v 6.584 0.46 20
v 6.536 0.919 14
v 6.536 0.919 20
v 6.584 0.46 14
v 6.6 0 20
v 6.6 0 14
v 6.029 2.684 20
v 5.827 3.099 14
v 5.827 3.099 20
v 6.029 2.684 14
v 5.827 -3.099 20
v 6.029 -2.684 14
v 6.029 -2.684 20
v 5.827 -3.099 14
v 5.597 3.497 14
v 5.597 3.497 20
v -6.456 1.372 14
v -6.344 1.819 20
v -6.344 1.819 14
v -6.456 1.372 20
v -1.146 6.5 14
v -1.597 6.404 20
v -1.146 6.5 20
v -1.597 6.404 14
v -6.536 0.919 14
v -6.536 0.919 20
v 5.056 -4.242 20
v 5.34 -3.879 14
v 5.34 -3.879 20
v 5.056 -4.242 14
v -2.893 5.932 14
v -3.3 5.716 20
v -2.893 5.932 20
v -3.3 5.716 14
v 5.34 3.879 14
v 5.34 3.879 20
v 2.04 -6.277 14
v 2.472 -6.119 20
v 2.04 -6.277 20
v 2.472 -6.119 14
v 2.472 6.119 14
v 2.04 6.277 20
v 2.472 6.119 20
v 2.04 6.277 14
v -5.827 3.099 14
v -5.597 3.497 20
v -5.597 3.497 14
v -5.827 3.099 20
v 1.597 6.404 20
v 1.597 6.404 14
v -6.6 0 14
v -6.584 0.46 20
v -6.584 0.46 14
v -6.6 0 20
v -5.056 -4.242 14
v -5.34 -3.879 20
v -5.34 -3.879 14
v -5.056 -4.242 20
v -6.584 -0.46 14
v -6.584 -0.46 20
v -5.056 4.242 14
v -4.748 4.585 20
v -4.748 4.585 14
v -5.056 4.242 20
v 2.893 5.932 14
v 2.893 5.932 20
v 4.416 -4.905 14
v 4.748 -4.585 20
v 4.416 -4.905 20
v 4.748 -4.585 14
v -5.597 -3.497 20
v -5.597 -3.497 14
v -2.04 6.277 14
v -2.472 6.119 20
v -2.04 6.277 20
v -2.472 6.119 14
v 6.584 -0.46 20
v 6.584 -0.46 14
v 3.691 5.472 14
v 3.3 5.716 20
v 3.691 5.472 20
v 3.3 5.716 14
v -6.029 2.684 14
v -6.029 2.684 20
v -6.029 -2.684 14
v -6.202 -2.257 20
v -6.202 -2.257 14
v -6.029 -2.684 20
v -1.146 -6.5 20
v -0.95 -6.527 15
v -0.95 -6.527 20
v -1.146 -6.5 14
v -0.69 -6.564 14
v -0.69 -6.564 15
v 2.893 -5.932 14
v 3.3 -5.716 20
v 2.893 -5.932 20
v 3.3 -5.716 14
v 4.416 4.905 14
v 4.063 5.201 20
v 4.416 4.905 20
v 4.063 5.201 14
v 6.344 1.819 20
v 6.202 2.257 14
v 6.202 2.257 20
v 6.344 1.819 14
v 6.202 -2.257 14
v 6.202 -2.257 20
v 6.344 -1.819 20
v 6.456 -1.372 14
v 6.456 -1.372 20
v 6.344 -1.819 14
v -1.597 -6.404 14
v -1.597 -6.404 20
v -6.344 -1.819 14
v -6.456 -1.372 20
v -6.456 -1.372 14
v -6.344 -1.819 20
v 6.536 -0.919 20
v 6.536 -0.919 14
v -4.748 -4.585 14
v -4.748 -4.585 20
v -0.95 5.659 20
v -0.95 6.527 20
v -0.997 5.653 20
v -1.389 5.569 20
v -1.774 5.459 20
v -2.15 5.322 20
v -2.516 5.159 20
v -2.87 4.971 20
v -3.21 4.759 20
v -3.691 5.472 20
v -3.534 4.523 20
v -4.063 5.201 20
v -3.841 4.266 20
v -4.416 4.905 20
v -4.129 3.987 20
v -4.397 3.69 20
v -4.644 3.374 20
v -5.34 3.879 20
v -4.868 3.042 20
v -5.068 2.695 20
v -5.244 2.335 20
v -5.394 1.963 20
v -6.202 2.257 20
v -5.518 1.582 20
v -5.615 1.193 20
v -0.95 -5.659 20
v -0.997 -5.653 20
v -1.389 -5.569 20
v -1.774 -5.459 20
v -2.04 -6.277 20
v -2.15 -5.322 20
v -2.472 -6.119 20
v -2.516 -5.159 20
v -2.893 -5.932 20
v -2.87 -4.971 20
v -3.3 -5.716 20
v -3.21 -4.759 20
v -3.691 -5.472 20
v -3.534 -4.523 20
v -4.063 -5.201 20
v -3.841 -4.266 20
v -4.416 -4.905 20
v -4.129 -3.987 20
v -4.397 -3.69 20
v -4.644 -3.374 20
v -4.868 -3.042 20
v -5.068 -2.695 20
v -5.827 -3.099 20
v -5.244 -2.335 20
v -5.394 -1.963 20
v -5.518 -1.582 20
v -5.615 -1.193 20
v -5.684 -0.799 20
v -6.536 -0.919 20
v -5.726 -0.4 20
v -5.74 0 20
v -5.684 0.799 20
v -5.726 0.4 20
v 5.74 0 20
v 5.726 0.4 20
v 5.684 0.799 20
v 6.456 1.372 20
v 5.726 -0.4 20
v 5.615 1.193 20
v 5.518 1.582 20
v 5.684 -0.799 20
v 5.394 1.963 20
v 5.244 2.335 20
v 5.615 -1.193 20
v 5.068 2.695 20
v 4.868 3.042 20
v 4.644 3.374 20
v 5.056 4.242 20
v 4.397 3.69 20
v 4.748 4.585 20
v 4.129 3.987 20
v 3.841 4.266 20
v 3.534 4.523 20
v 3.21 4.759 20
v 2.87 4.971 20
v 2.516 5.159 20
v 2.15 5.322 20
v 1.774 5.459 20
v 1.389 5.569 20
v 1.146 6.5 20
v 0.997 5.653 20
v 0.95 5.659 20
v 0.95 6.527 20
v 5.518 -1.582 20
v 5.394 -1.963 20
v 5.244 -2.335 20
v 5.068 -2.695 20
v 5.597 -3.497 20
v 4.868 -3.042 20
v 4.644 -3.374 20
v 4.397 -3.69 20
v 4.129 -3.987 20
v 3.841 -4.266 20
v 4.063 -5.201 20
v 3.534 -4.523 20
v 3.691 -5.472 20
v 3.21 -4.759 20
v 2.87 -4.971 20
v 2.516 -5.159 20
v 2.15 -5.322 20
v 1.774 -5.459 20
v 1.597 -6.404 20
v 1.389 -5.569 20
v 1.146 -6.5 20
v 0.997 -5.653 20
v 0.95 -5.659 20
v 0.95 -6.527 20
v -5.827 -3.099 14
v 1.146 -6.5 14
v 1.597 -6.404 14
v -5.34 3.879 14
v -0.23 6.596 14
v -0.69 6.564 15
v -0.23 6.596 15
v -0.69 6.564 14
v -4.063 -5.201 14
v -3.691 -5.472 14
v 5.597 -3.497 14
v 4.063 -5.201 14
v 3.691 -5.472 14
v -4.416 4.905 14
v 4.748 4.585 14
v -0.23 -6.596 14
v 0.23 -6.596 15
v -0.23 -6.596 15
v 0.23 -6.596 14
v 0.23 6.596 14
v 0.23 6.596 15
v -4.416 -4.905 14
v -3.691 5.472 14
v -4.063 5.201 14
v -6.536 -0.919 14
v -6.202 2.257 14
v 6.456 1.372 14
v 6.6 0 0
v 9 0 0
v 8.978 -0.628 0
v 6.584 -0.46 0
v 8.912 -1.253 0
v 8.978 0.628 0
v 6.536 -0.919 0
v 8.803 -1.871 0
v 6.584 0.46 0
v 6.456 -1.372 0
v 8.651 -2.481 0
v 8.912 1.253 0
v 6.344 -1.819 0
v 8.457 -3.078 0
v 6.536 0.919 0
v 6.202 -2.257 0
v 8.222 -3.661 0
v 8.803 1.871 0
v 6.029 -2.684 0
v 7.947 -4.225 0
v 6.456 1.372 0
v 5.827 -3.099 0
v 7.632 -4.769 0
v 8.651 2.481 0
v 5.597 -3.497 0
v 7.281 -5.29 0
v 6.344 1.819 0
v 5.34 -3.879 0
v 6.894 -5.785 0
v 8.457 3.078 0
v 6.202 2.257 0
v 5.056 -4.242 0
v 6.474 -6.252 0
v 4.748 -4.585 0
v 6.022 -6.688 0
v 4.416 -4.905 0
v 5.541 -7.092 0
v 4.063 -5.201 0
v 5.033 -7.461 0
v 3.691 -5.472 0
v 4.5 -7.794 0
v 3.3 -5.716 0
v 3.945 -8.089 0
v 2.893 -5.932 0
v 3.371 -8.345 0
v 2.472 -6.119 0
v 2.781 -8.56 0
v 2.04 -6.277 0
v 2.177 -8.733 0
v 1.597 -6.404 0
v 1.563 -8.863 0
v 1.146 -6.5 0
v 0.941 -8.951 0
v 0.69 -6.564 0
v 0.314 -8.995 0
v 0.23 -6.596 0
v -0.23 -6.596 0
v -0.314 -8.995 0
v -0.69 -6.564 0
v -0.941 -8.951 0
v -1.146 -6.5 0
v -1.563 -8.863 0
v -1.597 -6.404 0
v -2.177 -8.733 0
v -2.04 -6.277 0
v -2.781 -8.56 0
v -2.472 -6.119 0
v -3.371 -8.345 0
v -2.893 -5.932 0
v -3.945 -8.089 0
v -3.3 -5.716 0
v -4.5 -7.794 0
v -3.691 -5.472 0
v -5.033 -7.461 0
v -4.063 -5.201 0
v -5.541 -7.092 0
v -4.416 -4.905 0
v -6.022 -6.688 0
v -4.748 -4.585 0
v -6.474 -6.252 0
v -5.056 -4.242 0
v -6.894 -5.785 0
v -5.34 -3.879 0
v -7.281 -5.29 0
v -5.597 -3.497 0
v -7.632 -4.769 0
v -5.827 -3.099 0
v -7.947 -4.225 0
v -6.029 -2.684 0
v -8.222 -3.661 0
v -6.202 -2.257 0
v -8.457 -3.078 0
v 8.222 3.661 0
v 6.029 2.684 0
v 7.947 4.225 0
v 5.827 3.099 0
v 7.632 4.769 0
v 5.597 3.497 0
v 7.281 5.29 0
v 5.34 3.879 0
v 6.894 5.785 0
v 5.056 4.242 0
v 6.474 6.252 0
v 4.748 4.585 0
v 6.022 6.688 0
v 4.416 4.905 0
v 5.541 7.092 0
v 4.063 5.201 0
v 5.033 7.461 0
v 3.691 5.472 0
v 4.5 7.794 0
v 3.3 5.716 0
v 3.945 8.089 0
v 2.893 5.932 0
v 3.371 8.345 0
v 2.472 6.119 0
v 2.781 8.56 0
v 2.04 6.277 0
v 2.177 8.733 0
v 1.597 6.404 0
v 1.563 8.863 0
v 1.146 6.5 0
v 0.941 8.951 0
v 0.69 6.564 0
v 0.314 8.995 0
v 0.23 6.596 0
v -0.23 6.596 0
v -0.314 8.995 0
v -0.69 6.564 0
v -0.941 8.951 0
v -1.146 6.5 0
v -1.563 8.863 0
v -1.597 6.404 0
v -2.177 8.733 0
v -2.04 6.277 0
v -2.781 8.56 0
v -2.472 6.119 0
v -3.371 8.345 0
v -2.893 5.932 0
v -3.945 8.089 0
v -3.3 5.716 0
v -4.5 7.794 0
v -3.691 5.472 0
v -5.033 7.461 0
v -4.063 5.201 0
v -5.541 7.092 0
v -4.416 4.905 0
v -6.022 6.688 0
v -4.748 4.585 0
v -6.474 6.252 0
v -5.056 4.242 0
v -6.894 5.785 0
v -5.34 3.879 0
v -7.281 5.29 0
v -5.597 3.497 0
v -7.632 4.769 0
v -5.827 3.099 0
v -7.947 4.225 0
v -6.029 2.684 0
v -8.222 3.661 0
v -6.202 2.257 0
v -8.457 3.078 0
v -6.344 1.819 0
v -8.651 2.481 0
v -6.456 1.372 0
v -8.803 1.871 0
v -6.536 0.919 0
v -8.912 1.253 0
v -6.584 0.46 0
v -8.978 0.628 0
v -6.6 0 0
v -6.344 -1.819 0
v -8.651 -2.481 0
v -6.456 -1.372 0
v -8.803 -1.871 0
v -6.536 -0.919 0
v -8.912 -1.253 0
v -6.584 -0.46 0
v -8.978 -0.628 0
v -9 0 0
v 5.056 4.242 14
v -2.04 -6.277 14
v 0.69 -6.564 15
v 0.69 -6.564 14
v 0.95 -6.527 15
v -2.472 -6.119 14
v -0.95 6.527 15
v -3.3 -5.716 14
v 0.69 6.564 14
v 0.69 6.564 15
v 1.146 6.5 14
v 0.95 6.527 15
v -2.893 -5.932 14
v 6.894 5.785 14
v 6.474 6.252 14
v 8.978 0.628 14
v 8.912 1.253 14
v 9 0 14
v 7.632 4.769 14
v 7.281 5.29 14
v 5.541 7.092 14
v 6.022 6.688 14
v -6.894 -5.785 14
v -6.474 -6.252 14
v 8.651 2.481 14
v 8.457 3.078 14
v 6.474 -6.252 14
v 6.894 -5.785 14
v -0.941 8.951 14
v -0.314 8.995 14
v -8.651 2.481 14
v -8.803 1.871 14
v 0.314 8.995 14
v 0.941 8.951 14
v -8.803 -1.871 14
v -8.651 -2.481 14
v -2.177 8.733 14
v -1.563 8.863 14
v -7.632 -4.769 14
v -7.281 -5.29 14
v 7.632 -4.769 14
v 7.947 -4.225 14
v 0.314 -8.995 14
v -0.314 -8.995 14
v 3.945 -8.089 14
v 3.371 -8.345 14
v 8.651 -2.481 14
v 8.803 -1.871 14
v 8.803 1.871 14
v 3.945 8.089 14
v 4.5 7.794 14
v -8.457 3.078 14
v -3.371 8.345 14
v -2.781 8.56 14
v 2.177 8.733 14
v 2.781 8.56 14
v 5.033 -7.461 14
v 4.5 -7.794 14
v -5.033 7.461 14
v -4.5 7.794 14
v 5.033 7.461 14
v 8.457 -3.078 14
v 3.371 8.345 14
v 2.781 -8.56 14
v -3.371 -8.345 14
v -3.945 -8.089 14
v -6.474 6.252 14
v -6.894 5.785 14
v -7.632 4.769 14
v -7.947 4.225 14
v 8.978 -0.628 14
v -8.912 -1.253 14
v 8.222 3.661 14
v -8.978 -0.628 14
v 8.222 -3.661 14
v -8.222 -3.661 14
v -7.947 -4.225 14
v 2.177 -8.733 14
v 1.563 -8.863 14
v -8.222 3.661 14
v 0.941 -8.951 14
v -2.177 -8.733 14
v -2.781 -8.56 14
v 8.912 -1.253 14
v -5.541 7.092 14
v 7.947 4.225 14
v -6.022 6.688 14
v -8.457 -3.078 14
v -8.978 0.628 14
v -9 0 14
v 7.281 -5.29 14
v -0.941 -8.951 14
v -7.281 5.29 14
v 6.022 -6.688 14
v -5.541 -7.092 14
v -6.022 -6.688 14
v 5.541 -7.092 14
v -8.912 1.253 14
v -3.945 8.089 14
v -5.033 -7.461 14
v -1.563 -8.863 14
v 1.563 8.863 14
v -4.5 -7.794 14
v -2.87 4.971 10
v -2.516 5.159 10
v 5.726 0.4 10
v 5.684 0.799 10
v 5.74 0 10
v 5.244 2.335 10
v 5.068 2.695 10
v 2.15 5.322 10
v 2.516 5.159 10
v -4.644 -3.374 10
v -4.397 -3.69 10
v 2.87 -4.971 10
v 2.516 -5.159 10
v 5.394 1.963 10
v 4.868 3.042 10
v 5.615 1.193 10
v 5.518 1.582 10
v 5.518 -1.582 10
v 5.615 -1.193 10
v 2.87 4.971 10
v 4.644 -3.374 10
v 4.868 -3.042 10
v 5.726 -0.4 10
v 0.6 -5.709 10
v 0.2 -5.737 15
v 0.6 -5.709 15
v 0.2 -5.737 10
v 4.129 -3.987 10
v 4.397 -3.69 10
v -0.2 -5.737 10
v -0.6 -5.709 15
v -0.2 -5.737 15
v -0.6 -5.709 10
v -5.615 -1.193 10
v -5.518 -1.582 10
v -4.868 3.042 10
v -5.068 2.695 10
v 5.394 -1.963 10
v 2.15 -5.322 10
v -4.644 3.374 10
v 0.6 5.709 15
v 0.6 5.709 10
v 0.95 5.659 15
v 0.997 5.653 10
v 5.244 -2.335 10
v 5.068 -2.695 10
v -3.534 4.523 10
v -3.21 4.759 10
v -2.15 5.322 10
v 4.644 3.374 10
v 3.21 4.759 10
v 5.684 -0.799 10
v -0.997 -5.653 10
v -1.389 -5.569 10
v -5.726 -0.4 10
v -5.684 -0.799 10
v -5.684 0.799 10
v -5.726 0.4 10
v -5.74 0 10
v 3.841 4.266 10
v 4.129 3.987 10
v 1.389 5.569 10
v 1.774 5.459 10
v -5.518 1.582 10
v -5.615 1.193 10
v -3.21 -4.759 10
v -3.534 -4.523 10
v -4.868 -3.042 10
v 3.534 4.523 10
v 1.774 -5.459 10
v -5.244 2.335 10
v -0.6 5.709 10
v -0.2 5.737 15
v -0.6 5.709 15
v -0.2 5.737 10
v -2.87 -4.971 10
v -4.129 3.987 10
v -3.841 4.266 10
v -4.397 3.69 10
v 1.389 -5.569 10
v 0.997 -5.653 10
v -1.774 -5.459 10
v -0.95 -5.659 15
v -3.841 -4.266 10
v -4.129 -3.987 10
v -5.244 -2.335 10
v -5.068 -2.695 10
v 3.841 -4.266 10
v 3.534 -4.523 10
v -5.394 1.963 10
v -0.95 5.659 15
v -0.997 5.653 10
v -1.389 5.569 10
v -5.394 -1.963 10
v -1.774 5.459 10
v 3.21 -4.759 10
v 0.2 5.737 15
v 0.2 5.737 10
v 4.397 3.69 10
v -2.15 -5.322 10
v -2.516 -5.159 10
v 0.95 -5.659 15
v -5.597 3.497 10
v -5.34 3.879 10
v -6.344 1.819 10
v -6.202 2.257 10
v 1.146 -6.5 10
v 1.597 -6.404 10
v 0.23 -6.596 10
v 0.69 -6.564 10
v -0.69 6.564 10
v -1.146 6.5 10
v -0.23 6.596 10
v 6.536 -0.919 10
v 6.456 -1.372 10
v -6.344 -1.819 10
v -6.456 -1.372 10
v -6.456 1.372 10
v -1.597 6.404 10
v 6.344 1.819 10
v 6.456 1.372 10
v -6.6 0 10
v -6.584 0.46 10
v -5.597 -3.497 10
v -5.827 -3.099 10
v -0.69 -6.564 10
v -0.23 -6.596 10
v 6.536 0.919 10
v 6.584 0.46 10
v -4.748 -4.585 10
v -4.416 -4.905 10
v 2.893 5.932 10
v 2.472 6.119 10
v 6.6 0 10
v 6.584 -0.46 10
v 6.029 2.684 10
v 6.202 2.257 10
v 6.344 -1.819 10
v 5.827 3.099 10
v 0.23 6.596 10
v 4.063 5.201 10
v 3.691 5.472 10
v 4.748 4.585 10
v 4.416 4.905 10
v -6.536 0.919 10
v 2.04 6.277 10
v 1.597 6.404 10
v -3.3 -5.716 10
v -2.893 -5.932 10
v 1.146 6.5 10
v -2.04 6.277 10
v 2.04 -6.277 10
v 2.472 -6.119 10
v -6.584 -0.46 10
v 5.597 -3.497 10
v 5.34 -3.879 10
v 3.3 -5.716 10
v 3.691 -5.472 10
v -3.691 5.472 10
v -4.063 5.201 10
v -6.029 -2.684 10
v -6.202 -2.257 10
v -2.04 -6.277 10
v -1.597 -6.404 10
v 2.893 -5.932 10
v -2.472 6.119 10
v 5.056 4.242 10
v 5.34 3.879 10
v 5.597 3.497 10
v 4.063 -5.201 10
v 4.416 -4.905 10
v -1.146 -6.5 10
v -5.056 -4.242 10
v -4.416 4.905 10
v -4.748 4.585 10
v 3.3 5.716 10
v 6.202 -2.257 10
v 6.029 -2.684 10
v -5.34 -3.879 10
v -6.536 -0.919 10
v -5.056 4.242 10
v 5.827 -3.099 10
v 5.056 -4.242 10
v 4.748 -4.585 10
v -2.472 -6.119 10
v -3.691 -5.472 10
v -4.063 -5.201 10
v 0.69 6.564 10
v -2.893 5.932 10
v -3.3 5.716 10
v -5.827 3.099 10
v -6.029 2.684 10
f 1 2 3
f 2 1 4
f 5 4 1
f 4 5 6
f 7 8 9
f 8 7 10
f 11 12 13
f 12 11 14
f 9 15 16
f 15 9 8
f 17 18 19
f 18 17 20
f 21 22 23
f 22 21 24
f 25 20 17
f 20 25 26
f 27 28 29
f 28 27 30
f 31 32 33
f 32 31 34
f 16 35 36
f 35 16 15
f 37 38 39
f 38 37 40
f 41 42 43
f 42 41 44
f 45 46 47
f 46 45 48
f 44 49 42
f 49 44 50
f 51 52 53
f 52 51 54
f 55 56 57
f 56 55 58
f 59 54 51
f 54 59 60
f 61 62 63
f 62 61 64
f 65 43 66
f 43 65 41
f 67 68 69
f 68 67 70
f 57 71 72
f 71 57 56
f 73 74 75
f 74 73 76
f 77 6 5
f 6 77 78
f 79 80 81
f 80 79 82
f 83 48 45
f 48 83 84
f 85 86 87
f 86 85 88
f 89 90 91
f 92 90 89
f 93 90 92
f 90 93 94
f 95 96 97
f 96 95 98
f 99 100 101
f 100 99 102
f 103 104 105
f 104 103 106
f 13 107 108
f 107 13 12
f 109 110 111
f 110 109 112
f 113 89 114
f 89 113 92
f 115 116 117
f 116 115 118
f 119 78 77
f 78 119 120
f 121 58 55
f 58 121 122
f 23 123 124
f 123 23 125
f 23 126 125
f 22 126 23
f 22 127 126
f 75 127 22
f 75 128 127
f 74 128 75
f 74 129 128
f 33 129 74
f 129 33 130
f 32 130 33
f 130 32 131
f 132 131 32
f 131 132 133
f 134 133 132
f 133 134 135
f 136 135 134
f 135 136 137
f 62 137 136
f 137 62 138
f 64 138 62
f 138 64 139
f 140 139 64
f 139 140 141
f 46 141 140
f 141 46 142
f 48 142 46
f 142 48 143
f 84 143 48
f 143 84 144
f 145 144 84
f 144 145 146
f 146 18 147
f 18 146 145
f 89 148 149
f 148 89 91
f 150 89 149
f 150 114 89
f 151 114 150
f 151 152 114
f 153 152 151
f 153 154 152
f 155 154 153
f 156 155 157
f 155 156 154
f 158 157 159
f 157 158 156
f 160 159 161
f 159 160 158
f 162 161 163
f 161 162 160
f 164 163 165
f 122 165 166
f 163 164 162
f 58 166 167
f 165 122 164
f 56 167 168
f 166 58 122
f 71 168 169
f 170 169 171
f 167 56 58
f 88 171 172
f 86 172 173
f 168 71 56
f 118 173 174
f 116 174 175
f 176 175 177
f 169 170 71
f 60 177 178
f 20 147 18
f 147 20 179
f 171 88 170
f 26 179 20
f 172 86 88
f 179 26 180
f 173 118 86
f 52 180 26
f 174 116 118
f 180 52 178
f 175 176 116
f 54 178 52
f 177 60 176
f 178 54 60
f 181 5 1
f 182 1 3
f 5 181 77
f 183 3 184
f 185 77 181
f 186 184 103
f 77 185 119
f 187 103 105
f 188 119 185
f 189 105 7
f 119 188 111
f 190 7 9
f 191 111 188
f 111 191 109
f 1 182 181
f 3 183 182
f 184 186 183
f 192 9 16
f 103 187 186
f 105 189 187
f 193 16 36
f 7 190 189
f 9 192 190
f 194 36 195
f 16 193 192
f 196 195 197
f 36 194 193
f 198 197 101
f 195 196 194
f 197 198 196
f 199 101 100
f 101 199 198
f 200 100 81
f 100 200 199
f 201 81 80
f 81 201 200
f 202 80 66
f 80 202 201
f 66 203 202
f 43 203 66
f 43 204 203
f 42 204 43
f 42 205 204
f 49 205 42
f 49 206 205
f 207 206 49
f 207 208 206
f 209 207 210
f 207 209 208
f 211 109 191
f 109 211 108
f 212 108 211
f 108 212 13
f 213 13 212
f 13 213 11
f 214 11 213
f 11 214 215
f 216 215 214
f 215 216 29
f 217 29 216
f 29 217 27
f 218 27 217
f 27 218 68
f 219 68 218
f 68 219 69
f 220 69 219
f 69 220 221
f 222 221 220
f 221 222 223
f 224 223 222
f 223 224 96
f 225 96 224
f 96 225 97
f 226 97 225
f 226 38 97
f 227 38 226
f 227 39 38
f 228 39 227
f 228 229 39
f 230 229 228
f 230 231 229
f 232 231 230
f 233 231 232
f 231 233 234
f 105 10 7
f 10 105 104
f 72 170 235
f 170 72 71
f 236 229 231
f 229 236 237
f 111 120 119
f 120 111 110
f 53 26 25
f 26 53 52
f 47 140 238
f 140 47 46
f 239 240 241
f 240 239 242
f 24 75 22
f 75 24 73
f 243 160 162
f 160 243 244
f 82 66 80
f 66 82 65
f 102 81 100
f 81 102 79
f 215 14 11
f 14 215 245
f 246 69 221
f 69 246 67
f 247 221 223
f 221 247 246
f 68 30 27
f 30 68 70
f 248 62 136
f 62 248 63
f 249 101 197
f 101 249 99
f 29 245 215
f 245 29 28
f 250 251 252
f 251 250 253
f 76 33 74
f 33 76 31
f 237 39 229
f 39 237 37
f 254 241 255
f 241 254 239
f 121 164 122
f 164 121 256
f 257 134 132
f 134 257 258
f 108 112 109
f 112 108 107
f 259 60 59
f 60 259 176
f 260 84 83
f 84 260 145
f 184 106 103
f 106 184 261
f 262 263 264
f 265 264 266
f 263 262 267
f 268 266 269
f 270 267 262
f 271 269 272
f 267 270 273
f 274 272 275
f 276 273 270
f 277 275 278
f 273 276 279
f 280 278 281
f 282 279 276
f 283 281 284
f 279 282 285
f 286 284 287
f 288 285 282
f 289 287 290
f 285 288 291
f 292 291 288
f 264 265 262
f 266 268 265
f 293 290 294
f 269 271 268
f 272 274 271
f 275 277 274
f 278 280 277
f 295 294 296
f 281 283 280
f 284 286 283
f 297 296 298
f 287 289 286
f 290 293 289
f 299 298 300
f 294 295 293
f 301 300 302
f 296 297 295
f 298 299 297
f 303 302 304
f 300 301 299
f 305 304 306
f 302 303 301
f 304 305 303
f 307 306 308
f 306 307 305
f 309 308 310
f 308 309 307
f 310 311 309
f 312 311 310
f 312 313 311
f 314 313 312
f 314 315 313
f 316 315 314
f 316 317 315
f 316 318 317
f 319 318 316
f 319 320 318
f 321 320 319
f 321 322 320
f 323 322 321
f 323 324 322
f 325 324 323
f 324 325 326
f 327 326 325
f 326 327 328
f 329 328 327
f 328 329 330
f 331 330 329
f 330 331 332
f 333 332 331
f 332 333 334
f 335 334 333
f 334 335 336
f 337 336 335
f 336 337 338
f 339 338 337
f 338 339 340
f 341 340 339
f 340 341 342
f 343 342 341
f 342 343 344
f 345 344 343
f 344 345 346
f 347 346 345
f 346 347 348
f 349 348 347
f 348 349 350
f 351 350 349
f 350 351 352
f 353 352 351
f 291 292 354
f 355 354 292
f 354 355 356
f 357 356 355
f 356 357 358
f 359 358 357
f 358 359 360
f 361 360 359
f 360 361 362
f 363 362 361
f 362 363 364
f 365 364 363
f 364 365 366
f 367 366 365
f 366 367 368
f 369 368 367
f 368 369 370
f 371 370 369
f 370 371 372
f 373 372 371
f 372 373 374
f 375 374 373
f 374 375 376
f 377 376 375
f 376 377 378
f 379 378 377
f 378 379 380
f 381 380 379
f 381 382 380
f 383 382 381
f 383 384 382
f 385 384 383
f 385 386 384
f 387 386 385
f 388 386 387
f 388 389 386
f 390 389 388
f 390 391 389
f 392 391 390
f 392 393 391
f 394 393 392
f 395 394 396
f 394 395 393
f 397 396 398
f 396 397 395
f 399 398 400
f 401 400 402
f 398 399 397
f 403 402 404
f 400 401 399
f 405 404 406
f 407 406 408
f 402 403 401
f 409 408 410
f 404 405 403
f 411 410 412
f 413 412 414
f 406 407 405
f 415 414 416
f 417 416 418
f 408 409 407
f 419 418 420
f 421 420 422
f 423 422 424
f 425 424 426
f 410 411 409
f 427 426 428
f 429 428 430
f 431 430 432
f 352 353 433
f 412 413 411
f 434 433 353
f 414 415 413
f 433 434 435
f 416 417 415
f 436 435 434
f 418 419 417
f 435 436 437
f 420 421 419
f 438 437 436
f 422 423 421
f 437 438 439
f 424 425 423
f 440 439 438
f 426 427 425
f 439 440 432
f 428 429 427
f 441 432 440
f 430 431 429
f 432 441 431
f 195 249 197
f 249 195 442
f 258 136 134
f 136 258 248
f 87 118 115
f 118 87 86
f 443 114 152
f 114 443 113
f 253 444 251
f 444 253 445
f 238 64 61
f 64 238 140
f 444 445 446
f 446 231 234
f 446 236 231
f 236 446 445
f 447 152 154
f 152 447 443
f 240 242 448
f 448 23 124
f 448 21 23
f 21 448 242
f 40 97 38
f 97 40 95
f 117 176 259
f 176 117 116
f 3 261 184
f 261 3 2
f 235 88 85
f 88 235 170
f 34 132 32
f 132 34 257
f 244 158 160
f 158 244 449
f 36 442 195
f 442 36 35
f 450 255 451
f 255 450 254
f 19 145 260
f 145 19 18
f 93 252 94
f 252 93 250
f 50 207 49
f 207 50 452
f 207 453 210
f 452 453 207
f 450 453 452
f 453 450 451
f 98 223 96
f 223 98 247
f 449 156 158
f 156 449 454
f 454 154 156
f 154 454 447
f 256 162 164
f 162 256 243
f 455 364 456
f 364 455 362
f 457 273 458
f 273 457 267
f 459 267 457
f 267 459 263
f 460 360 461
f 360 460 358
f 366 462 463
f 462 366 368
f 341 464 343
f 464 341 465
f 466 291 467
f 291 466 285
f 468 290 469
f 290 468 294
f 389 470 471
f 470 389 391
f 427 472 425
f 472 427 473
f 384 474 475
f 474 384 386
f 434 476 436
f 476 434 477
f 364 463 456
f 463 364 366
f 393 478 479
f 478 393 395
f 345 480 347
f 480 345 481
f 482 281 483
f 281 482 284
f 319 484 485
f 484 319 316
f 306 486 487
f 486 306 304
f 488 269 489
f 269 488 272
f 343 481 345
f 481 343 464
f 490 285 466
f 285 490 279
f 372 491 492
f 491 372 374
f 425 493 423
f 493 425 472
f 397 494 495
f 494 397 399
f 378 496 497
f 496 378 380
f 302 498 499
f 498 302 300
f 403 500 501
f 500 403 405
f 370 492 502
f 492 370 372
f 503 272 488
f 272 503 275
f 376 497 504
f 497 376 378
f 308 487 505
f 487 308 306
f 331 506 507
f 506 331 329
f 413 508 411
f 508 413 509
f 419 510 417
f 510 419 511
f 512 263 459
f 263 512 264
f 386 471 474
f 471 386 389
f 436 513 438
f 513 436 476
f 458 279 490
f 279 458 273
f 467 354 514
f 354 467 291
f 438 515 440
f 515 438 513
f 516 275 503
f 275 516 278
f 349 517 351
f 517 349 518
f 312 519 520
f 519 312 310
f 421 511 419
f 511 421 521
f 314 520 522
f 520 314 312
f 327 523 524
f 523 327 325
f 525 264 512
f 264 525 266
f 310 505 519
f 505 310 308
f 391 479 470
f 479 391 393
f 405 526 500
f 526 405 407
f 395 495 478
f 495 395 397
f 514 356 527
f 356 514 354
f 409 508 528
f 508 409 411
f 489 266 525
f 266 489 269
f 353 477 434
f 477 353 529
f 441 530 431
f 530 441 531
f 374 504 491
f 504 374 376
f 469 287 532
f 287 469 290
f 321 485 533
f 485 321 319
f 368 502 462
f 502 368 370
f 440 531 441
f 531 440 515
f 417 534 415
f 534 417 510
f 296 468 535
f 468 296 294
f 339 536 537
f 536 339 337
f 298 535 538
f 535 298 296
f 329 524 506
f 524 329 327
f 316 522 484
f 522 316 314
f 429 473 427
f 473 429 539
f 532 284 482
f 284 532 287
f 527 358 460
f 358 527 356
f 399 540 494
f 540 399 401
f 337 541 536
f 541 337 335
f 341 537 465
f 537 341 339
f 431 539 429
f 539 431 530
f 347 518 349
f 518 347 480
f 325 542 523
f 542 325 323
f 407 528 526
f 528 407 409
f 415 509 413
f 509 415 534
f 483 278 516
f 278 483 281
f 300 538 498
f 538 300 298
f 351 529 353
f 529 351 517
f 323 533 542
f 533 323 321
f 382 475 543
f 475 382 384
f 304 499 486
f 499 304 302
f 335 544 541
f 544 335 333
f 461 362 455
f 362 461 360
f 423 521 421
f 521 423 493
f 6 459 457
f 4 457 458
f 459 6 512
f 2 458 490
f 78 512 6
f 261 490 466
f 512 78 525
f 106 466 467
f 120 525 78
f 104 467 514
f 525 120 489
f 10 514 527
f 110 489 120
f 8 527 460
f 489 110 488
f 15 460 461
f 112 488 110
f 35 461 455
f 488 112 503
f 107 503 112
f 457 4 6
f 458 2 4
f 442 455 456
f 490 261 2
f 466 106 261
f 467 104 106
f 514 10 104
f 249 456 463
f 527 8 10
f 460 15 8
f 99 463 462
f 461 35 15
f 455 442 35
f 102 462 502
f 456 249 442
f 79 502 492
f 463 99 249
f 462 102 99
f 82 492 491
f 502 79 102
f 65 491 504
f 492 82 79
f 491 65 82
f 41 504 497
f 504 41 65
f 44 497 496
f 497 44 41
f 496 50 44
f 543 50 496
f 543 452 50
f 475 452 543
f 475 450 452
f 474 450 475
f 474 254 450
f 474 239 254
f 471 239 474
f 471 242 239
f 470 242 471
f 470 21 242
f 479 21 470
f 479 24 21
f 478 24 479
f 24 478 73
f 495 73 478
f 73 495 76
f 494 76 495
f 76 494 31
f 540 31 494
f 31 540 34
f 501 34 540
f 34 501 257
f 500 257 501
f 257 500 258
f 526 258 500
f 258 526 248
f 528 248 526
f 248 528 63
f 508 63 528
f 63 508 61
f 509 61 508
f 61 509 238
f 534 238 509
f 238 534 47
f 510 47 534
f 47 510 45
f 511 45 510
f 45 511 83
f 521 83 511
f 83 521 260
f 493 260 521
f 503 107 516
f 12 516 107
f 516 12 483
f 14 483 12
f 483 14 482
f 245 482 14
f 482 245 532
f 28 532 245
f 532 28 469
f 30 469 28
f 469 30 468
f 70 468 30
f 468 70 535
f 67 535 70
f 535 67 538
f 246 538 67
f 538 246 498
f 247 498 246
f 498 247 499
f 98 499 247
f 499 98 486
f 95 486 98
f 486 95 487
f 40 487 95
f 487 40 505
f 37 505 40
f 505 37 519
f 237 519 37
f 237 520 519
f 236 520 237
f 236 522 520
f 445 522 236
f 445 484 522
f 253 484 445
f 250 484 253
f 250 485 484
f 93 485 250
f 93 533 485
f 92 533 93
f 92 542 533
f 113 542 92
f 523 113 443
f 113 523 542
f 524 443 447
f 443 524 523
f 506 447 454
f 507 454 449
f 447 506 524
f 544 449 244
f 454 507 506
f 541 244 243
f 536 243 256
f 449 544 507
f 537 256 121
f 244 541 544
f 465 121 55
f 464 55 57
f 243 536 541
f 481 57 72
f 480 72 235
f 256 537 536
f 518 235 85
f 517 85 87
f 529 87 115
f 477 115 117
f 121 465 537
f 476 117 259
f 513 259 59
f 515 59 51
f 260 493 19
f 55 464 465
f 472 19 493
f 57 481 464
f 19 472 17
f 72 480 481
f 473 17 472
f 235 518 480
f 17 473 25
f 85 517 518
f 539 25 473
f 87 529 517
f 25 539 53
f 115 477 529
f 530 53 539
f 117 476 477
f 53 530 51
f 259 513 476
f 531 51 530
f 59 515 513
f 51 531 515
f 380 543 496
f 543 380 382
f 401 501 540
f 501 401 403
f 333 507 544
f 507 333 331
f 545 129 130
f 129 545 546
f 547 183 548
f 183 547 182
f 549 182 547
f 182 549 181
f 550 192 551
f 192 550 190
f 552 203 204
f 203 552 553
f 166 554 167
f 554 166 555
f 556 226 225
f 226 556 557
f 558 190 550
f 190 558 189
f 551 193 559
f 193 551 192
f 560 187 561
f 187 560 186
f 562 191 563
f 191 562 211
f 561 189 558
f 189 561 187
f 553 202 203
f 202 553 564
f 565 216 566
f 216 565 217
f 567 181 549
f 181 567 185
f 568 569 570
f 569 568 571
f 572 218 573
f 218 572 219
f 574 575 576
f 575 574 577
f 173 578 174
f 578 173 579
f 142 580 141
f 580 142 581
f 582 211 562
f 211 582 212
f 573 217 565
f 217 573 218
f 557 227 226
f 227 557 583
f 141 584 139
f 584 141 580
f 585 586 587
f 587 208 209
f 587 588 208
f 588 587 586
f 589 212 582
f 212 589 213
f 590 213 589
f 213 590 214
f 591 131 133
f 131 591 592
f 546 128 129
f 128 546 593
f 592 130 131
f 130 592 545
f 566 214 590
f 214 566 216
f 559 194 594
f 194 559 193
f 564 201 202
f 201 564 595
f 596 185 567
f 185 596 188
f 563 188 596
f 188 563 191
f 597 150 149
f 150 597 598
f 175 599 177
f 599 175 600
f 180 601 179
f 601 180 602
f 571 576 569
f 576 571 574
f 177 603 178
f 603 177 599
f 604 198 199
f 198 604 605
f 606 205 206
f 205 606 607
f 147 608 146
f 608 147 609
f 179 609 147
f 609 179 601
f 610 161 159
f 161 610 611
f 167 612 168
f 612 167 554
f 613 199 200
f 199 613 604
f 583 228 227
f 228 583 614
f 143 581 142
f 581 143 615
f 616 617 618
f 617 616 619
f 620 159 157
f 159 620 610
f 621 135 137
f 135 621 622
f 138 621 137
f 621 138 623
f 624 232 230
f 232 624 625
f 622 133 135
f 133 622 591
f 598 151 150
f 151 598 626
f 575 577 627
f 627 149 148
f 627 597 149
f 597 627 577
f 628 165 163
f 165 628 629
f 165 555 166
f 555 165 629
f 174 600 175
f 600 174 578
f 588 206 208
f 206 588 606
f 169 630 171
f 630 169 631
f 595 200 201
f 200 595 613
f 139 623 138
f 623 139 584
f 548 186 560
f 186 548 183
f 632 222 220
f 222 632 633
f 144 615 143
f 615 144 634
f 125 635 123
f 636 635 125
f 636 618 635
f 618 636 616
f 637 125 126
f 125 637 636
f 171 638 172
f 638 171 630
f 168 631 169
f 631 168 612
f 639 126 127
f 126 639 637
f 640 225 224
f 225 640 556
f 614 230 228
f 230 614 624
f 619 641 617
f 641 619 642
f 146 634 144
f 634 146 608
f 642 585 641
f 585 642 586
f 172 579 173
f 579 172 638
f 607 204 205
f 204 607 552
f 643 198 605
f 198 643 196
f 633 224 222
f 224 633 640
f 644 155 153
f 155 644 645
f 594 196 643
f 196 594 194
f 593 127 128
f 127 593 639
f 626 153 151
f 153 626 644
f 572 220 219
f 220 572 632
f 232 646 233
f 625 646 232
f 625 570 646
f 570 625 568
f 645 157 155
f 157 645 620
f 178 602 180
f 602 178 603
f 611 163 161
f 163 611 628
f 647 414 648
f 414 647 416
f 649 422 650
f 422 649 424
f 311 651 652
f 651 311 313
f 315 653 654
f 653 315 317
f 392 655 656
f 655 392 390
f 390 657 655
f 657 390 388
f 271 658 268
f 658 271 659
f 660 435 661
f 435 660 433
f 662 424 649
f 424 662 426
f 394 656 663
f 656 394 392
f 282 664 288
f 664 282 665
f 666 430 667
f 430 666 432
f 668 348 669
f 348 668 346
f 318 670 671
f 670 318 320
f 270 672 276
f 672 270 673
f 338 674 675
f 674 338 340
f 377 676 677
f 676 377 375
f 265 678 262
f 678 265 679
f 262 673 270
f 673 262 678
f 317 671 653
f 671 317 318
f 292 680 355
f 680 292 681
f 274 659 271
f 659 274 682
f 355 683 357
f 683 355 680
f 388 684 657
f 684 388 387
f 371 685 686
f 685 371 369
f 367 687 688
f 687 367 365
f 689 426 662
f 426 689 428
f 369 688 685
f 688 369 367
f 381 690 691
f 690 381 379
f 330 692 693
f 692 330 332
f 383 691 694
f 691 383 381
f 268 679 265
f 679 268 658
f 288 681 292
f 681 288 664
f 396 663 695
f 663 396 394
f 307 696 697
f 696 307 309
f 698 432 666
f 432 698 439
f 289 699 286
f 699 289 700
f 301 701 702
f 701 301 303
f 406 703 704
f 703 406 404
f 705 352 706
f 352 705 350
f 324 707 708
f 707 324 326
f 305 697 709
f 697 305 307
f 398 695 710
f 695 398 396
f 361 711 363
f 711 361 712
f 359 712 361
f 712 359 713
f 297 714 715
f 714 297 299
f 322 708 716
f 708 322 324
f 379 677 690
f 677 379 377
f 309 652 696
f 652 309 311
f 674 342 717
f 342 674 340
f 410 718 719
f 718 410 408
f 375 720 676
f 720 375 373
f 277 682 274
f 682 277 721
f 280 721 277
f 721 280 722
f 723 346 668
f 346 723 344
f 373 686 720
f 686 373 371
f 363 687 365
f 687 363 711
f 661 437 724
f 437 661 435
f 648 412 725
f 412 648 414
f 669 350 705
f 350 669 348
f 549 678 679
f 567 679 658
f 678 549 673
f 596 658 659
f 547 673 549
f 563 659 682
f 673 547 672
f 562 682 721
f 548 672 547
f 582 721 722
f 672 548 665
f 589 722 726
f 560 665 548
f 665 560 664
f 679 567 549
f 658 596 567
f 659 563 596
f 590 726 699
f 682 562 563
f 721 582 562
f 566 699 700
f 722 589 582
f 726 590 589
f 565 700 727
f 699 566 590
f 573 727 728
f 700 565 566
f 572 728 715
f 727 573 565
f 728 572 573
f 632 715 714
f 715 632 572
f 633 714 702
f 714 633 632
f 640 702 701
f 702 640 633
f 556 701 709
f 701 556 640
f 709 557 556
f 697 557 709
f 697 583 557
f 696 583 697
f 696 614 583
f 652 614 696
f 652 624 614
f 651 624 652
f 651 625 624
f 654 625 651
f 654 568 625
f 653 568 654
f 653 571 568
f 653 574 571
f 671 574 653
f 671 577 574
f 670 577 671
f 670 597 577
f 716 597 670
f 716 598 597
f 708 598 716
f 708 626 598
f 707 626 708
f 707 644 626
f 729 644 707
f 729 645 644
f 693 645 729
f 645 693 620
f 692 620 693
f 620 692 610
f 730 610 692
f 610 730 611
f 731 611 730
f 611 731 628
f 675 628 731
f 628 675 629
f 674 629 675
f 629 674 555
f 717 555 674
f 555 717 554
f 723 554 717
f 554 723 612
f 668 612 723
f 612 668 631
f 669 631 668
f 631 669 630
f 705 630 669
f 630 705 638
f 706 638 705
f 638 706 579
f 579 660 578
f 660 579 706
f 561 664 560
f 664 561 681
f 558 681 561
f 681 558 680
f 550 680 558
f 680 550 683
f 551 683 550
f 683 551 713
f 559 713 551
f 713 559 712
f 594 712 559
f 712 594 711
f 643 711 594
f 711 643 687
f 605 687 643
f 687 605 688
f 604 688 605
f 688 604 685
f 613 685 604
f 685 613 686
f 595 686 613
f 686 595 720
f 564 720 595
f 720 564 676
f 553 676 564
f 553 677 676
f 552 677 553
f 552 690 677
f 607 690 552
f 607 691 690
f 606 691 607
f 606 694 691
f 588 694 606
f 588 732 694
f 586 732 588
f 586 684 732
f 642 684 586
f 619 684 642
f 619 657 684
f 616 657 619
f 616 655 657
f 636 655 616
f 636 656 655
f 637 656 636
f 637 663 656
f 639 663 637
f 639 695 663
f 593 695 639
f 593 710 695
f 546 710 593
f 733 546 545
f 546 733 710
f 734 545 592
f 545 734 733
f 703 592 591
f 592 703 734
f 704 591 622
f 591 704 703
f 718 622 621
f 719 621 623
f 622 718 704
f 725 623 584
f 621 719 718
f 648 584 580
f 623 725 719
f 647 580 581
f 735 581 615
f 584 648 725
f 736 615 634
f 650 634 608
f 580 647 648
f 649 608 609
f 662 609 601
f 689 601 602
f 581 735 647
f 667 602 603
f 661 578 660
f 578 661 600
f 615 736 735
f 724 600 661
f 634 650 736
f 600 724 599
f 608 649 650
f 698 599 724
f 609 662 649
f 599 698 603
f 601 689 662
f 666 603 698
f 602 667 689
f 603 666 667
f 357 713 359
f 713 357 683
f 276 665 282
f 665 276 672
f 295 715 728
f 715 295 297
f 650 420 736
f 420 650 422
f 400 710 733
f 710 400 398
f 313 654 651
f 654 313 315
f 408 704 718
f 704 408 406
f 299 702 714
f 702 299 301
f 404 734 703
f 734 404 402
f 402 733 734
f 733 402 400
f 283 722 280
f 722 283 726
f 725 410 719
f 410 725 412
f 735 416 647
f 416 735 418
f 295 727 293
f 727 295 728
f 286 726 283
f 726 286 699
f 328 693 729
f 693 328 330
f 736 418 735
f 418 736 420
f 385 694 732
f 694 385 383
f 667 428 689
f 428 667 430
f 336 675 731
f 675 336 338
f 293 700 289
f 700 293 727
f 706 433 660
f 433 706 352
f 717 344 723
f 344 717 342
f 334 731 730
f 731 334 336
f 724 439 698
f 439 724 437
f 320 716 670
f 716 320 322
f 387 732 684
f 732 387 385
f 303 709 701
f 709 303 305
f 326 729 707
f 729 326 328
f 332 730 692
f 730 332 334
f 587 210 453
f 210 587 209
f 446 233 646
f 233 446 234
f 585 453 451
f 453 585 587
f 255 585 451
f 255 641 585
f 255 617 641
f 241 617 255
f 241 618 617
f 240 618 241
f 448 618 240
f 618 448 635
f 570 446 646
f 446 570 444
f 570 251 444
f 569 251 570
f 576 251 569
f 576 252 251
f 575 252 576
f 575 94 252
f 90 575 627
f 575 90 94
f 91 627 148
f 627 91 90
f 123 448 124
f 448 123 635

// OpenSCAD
/*
 * Race track support
 *
 * Author: Pavel Rampas
 * Version: 1.0.0 (Changelog is at the bottom)
 * License: CC BY-SA 4.0 [https://creativecommons.org/licenses/by-sa/4.0/]
 * Link: https://github.com/pavelrampas/openscad-models
 *
 * OpenSCAD version: 2021.01
 *
 * Instructions:
 * Set up parameters, render and print.
 *
 * Height is layer.
 * Thickness is perimeter.
 */

// Parameters
//------------------------------------------------------------------------------

$fn = $preview ? 15 : 90;

part = "column"; // column or base

// column parameters
height = 20;

topDiameter = 13.2;
topThickness = 0.86;
topCutSize = 1.9;

bottomDiameter = 18;
bottomHeight = 14;

holeHeight = 10;

// base parameters
baseHeight = 9;

baseTopDiameter = topDiameter;
baseTopThickness = topThickness;
baseTopCutThickness = topCutSize;

baseBottomDiameter = 36;
baseBottomHeight = 3;

// Code
//------------------------------------------------------------------------------

if (part == "column") {
    difference() {
        union() {
            cylinder(h = height, d = topDiameter);
            cylinder(h = bottomHeight, d = bottomDiameter);
        }
        cylinder(h = height, d = topDiameter - (2 * topThickness));
        cylinder(h = holeHeight, d = topDiameter);
        translate([-(topCutSize / 2), -(bottomDiameter / 2), bottomHeight + 1]) {
            cube([topCutSize, bottomDiameter, height]);
        }
    }
}

if (part == "base") {
    difference() {
        union() {
            cylinder(h = baseHeight, d = baseTopDiameter);
            cylinder(h = baseBottomHeight, d = baseBottomDiameter);
        }
        cylinder(h = baseHeight, d = topDiameter - (2 * topThickness));
        translate([
            -(baseTopCutThickness / 2),
            -(baseBottomDiameter / 2),
            baseBottomHeight + 1
        ]) {
            cube([baseTopCutThickness, baseBottomDiameter, baseHeight]);
        }
    }
}

// Functions
//------------------------------------------------------------------------------

// Modules
//------------------------------------------------------------------------------

// Changelog
//------------------------------------------------------------------------------

// [1.0.0]:
// Initial release.
